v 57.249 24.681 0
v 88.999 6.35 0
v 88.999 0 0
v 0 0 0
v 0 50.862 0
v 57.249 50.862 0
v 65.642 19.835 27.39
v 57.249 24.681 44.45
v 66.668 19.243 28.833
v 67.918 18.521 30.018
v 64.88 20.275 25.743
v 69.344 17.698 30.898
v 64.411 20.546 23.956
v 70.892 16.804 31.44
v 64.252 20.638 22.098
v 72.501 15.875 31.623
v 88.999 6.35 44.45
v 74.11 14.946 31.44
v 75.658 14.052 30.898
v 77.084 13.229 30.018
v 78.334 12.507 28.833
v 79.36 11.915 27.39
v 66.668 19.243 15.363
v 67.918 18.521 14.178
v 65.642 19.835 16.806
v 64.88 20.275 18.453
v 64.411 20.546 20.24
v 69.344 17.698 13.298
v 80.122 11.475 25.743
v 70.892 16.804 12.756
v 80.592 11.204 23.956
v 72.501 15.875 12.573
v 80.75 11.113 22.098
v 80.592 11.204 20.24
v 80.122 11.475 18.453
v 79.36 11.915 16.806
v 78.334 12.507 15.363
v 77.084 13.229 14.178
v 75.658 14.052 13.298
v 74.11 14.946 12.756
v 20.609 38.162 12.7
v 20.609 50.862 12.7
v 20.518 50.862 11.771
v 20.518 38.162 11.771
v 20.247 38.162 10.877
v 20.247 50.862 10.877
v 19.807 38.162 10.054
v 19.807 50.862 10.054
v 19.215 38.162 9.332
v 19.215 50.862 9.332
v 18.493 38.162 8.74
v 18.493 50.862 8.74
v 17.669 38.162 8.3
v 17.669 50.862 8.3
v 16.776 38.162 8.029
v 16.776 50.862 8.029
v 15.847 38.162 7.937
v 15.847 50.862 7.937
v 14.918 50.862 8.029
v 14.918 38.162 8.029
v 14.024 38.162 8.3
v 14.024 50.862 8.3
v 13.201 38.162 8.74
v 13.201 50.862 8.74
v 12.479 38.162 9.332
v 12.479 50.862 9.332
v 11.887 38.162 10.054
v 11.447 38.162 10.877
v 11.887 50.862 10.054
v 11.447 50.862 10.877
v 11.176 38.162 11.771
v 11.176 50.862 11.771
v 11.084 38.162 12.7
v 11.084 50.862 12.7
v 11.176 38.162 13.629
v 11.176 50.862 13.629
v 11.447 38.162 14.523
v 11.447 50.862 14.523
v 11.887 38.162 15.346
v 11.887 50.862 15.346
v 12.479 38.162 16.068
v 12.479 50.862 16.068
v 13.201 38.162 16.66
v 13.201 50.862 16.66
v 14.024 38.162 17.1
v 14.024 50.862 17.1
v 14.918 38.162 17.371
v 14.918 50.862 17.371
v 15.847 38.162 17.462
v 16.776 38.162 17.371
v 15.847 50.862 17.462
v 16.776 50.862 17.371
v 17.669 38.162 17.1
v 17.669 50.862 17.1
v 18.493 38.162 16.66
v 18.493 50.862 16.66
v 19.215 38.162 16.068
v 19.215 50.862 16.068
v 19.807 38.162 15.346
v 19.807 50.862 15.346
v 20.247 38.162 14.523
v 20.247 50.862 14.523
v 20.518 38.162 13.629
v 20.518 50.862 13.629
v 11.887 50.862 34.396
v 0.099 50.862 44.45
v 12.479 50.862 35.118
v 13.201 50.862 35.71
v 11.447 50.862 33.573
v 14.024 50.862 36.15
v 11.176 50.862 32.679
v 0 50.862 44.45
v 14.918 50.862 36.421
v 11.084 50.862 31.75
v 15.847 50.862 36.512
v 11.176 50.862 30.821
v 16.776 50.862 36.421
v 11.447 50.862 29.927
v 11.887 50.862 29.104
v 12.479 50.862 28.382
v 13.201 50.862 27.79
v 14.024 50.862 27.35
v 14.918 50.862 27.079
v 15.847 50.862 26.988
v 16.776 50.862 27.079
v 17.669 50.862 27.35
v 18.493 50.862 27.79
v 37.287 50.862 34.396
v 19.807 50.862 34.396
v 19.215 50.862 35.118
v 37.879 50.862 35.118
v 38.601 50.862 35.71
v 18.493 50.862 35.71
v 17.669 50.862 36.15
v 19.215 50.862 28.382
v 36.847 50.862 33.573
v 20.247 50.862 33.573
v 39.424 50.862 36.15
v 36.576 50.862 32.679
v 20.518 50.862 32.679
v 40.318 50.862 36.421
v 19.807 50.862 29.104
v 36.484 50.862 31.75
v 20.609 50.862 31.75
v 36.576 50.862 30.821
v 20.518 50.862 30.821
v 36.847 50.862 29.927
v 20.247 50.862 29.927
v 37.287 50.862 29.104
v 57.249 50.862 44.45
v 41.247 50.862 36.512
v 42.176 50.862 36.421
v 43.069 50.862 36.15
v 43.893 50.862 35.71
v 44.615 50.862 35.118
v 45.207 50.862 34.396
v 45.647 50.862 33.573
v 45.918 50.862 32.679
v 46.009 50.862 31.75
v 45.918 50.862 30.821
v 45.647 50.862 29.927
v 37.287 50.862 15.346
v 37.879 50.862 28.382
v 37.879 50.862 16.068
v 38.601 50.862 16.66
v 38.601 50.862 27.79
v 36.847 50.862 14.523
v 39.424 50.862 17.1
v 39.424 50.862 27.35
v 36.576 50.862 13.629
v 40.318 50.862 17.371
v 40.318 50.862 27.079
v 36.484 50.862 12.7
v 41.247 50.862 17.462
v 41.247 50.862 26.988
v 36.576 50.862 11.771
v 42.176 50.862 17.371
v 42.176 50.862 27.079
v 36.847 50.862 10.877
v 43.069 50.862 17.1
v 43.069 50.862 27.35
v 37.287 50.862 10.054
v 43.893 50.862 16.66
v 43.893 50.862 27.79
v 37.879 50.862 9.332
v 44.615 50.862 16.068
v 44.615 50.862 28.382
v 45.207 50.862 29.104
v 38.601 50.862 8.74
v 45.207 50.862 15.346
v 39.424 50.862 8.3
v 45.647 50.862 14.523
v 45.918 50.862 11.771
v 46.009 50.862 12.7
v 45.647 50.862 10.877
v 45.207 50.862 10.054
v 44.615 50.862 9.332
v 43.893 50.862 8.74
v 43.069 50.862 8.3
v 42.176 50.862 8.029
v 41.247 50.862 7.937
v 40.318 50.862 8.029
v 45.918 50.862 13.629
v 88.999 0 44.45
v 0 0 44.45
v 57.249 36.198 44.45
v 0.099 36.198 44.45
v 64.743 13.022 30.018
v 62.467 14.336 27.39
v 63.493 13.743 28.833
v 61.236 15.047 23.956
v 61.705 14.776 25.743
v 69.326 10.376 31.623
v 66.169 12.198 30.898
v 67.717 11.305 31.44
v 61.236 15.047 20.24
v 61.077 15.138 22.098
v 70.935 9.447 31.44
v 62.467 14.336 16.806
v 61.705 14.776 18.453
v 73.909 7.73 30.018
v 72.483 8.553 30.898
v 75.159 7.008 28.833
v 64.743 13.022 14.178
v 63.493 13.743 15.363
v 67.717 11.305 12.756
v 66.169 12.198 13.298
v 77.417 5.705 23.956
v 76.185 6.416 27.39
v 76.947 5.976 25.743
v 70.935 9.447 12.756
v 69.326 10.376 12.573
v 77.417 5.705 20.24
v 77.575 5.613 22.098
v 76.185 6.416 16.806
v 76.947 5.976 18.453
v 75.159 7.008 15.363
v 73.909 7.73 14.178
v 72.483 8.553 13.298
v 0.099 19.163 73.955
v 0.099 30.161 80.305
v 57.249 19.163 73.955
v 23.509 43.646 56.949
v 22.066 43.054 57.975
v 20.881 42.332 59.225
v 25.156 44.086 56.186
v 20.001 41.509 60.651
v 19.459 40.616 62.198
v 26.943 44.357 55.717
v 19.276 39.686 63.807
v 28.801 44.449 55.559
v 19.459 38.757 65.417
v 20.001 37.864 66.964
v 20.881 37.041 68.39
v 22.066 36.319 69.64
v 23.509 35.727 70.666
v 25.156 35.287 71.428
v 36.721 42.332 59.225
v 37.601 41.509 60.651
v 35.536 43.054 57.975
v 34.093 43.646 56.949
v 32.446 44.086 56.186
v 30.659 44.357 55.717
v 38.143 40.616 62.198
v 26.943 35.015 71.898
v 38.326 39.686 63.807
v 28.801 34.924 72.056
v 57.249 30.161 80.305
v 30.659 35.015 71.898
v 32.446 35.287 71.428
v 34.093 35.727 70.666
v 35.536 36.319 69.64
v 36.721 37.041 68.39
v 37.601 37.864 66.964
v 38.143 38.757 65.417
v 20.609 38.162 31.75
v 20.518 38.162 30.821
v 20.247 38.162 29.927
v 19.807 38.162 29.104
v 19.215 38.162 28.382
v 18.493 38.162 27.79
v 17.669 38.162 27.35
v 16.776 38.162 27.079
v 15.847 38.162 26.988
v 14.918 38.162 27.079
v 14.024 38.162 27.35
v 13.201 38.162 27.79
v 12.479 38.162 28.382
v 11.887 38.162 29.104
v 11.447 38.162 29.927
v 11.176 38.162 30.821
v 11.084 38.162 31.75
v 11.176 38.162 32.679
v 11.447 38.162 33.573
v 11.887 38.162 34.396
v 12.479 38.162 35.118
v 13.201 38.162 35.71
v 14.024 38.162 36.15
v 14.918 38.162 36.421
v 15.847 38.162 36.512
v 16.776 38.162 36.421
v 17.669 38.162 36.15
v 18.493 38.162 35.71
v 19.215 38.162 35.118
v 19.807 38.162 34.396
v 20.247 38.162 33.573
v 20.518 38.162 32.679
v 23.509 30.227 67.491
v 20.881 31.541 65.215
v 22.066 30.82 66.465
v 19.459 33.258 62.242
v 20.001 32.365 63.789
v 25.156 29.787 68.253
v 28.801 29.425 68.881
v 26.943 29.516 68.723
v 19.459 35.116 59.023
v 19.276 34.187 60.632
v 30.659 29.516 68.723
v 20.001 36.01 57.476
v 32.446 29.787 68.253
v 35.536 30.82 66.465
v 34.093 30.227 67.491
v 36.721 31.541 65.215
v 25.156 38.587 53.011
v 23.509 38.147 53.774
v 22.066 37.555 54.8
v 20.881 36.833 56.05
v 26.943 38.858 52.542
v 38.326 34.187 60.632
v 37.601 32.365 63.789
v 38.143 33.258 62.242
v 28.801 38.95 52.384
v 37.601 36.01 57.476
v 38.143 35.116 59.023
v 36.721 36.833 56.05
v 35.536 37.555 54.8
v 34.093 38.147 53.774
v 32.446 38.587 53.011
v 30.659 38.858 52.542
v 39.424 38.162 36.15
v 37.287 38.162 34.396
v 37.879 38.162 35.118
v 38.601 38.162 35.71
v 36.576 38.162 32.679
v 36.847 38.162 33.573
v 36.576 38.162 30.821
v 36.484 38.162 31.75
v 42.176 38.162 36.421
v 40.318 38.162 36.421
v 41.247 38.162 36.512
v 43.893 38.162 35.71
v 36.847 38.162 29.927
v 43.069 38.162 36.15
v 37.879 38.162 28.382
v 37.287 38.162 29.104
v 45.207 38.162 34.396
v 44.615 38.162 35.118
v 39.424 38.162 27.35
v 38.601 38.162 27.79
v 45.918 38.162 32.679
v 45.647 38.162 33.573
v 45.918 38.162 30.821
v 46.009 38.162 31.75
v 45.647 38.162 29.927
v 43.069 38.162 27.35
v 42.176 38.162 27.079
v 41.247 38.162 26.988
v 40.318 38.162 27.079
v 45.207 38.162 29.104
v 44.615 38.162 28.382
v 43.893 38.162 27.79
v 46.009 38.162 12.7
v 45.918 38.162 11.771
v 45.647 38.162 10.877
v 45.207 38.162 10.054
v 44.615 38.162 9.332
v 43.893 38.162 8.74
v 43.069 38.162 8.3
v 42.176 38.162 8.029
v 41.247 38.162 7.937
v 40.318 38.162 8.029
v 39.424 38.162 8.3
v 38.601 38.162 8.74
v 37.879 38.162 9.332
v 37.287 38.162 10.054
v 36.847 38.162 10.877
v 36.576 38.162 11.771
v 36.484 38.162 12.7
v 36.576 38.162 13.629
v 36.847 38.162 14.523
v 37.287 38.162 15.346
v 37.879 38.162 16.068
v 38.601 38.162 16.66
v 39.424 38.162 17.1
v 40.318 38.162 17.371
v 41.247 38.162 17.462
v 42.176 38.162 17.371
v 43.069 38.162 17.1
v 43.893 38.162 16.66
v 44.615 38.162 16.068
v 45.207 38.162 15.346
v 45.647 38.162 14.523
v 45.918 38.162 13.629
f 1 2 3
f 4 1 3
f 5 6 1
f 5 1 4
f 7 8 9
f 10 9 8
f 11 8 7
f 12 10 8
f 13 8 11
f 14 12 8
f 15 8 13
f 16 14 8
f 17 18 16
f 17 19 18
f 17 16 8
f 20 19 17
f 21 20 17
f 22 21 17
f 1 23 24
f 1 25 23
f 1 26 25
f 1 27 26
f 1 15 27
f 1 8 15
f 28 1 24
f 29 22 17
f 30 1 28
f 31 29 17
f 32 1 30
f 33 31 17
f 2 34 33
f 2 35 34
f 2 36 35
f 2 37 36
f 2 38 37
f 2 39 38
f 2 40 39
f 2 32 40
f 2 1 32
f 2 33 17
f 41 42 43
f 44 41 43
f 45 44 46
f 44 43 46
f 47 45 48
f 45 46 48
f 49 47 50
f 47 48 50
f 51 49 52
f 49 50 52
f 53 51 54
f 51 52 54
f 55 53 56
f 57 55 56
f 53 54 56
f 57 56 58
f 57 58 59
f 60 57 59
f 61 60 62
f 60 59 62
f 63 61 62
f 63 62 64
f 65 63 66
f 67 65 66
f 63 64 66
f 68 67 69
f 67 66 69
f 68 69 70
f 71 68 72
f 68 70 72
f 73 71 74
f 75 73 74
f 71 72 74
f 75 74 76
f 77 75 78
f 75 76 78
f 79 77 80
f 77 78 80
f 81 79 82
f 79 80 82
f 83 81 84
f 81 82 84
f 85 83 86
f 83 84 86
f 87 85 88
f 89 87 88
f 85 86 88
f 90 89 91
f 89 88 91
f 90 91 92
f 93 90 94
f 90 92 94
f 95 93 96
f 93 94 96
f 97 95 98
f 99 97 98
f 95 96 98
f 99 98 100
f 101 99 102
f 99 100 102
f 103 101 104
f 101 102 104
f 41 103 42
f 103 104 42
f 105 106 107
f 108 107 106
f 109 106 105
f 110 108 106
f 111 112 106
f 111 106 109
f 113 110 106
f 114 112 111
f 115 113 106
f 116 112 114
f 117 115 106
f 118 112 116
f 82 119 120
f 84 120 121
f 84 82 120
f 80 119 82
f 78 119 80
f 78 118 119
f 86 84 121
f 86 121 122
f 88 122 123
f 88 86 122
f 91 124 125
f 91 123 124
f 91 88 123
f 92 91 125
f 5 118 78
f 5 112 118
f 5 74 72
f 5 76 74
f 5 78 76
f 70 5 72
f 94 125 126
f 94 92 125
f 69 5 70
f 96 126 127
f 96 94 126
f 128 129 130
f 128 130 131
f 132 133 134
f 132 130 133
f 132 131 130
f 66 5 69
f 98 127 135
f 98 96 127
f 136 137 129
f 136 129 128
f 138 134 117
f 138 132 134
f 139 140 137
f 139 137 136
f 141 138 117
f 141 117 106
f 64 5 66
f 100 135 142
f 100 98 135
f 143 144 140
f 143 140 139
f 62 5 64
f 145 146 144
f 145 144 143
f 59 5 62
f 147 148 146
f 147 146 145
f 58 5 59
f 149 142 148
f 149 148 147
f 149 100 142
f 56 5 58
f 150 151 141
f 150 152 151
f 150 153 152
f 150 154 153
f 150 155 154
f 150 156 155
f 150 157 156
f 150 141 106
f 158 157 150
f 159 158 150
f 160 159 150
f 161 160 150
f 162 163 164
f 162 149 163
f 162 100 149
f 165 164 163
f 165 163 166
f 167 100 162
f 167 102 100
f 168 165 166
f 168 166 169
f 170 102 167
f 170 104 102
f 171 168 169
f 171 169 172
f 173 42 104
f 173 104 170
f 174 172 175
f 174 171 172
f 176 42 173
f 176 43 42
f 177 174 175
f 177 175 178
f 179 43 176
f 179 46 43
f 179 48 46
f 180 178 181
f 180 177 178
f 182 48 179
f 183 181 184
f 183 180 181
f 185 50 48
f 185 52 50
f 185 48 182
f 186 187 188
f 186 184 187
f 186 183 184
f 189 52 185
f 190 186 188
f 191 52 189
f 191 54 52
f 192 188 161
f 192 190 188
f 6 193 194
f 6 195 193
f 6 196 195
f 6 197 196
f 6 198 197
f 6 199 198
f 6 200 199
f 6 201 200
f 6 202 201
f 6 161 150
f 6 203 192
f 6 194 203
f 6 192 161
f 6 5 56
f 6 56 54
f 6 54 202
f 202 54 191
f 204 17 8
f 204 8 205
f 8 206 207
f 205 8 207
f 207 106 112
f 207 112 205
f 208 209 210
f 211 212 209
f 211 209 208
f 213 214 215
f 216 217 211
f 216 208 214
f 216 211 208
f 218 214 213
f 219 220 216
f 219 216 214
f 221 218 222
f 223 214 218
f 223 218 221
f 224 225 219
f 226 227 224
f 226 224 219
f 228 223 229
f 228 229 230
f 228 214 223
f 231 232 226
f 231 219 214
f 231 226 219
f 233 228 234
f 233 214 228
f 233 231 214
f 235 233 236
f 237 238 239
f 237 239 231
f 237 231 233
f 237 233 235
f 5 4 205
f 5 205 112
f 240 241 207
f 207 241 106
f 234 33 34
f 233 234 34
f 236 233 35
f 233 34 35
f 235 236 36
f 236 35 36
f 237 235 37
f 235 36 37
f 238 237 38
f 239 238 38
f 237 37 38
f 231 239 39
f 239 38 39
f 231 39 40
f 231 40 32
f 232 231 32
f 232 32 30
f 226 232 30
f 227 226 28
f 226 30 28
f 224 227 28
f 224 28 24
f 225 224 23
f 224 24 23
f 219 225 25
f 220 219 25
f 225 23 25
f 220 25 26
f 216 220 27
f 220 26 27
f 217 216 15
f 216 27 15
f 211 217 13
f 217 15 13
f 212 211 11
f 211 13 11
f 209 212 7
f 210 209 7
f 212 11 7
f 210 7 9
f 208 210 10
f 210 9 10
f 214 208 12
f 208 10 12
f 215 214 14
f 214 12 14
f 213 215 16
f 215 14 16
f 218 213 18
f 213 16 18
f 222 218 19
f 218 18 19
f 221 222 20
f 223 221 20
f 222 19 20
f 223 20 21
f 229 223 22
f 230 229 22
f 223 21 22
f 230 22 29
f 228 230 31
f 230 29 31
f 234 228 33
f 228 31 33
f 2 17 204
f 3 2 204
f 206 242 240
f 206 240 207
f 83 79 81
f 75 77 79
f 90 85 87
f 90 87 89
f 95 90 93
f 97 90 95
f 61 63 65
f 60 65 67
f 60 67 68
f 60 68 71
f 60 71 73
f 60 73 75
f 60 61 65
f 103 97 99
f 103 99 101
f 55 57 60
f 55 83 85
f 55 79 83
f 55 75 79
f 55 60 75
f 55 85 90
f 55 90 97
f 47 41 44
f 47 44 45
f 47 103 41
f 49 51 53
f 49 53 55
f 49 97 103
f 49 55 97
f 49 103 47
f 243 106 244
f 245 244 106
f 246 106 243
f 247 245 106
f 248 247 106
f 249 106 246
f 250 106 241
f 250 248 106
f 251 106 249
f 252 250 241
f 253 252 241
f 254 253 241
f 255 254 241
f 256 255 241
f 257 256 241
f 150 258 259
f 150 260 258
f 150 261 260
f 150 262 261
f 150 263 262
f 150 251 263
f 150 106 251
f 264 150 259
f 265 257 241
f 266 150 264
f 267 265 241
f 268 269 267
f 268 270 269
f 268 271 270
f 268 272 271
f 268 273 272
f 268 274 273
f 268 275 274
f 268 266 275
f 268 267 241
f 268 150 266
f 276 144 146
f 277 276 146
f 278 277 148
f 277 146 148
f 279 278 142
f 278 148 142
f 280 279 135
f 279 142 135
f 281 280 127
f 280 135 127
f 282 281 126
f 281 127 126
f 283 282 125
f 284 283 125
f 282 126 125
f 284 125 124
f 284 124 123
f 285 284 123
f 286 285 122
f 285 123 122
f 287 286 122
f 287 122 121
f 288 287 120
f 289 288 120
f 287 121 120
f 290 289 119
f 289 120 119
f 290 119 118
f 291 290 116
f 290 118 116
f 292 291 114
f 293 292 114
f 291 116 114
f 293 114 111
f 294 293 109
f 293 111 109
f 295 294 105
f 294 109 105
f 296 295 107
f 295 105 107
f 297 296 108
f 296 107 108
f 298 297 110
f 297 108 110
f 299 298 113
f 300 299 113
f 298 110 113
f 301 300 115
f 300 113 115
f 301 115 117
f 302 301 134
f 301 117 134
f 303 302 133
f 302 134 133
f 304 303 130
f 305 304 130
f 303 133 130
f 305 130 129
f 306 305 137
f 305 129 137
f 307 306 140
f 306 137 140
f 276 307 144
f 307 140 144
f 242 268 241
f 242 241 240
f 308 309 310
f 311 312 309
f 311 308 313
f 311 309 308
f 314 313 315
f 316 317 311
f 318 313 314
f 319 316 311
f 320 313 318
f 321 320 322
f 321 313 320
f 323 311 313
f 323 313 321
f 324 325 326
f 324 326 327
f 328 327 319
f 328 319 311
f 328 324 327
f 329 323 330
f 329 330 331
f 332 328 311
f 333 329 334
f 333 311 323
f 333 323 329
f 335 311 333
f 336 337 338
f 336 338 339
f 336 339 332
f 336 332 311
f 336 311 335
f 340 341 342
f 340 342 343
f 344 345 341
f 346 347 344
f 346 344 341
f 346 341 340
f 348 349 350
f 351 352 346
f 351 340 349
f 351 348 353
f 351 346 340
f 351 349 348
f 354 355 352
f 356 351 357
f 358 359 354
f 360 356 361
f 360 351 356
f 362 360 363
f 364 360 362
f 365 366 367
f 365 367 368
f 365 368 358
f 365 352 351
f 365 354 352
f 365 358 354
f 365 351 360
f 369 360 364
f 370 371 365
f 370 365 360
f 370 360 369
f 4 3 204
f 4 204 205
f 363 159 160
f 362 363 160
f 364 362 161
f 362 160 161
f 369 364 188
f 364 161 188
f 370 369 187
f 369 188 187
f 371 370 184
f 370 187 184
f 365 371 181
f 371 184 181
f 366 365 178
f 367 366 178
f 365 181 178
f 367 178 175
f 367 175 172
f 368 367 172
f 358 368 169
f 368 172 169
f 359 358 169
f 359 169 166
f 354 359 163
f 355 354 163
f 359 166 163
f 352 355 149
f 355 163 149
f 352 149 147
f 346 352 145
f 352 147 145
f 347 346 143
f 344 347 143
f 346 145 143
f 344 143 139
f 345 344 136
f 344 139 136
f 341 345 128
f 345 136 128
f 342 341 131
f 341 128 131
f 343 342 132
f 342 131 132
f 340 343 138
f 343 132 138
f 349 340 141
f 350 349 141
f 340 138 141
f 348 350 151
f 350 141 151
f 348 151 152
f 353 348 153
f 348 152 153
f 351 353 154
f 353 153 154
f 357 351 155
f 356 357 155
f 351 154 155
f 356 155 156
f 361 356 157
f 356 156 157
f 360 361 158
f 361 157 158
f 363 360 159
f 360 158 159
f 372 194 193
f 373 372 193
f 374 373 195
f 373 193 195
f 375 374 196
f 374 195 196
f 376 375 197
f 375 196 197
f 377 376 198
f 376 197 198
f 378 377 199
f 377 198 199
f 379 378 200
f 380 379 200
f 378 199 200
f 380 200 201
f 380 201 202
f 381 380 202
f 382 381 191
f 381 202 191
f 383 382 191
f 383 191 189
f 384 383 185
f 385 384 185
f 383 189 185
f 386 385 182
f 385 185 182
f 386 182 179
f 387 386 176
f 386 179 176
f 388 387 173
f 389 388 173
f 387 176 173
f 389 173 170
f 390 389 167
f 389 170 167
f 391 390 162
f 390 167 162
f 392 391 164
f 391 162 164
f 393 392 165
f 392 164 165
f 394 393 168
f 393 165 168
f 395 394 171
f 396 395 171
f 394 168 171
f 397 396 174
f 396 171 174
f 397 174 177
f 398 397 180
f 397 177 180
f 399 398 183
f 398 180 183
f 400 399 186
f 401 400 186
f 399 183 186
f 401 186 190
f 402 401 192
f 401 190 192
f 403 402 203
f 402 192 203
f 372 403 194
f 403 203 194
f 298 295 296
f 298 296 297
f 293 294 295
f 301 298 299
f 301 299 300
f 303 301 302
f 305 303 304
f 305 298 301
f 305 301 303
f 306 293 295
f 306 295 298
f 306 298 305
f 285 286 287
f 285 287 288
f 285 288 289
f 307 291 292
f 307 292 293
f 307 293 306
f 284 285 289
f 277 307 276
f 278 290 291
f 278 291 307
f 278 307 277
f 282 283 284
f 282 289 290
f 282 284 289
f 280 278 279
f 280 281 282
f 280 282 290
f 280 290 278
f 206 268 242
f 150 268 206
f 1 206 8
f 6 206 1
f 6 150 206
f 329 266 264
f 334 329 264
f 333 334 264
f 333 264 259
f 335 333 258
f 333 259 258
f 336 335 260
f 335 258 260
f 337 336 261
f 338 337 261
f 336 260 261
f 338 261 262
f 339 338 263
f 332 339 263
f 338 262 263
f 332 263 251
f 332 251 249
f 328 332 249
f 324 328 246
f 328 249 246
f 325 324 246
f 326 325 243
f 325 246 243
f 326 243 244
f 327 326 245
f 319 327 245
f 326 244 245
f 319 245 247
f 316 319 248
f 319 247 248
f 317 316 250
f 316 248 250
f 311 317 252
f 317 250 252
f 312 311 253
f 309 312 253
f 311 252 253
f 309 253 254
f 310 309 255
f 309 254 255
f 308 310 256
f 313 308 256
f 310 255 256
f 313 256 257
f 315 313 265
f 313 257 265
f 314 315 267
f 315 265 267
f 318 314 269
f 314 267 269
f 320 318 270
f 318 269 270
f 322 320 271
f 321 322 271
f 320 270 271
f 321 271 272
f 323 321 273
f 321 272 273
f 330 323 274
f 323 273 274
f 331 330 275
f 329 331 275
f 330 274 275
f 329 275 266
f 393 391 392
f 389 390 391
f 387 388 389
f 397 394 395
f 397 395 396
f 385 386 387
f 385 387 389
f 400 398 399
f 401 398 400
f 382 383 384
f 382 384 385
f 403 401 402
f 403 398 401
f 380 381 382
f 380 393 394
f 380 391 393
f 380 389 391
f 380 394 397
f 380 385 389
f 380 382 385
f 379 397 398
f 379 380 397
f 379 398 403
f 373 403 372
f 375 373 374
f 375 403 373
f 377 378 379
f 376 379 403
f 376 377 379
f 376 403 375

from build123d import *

# Parameters (mm, degrees)
BOSS_EXTRUDE1_DEPTH = 44.45
BOSS_EXTRUDE2_DEPTH = 57.15
SKETCH5_R           = 9.525
CUT_EXTRUDE1_DEPTH  = 6.35
SKETCH6_R           = 9.525
CUT_EXTRUDE2_DEPTH  = 6.35
SKETCH7_R           = 4.7625
CUT_EXTRUDE3_DEPTH  = 12.7


with BuildPart() as part:
    # Sketch1 → Boss-Extrude1 (new body)
    with BuildSketch(Plane.XY):
        Polygon((0, 0), (0, 50.862487244), (57.248927697, 50.862487244), (57.248927697, 24.680871047), (88.998927697, 6.35), (88.998927697, 0), align=None)
    extrude(amount=BOSS_EXTRUDE1_DEPTH)

    # Sketch2 → Boss-Extrude2 (add)
    with BuildSketch(Plane(origin=(57.248927697, 0, 0), x_dir=(0, 0, -1), z_dir=(1, 0, 0))):
        Polygon((-44.45, 50.862487244), (-80.305183767, 30.161487244), (-73.955183767, 19.162964616), (-44.45, 36.197790407), align=None)
    extrude(amount=-BOSS_EXTRUDE2_DEPTH)

    # Sketch5 → Cut-Extrude1 (cut)
    with BuildSketch(Plane(origin=(0, 57.394280032, 33.136603026), x_dir=(1, 0, 0), z_dir=(0, 0.866025404, 0.5))):
        with Locations((28.800927697, -35.415585576)):
            Circle(SKETCH5_R)
    extrude(amount=-CUT_EXTRUDE1_DEPTH, mode=Mode.SUBTRACT)

    # Sketch6 → Cut-Extrude2 (cut)
    with BuildSketch(Plane(origin=(24.999362581, 43.300166148, 0), x_dir=(0.866025404, -0.5, 0), z_dir=(0.5, 0.866025404, 0))):
        with Locations((54.850332296, -22.098)):
            Circle(SKETCH6_R)
    extrude(amount=-CUT_EXTRUDE2_DEPTH, mode=Mode.SUBTRACT)

    # Sketch7 → Cut-Extrude3 (cut)
    with BuildSketch(Plane(origin=(0, 50.862487244, 0), x_dir=(1, 0, 0), z_dir=(0, 1, 0))):
        with Locations((15.846927697, -12.7)):
            Circle(SKETCH7_R)
        with Locations((15.846927697, -31.75)):
            Circle(SKETCH7_R)
        with Locations((41.246927697, -31.75)):
            Circle(SKETCH7_R)
        with Locations((41.246927697, -12.7)):
            Circle(SKETCH7_R)
    extrude(amount=-CUT_EXTRUDE3_DEPTH, mode=Mode.SUBTRACT)


solid = part.part
